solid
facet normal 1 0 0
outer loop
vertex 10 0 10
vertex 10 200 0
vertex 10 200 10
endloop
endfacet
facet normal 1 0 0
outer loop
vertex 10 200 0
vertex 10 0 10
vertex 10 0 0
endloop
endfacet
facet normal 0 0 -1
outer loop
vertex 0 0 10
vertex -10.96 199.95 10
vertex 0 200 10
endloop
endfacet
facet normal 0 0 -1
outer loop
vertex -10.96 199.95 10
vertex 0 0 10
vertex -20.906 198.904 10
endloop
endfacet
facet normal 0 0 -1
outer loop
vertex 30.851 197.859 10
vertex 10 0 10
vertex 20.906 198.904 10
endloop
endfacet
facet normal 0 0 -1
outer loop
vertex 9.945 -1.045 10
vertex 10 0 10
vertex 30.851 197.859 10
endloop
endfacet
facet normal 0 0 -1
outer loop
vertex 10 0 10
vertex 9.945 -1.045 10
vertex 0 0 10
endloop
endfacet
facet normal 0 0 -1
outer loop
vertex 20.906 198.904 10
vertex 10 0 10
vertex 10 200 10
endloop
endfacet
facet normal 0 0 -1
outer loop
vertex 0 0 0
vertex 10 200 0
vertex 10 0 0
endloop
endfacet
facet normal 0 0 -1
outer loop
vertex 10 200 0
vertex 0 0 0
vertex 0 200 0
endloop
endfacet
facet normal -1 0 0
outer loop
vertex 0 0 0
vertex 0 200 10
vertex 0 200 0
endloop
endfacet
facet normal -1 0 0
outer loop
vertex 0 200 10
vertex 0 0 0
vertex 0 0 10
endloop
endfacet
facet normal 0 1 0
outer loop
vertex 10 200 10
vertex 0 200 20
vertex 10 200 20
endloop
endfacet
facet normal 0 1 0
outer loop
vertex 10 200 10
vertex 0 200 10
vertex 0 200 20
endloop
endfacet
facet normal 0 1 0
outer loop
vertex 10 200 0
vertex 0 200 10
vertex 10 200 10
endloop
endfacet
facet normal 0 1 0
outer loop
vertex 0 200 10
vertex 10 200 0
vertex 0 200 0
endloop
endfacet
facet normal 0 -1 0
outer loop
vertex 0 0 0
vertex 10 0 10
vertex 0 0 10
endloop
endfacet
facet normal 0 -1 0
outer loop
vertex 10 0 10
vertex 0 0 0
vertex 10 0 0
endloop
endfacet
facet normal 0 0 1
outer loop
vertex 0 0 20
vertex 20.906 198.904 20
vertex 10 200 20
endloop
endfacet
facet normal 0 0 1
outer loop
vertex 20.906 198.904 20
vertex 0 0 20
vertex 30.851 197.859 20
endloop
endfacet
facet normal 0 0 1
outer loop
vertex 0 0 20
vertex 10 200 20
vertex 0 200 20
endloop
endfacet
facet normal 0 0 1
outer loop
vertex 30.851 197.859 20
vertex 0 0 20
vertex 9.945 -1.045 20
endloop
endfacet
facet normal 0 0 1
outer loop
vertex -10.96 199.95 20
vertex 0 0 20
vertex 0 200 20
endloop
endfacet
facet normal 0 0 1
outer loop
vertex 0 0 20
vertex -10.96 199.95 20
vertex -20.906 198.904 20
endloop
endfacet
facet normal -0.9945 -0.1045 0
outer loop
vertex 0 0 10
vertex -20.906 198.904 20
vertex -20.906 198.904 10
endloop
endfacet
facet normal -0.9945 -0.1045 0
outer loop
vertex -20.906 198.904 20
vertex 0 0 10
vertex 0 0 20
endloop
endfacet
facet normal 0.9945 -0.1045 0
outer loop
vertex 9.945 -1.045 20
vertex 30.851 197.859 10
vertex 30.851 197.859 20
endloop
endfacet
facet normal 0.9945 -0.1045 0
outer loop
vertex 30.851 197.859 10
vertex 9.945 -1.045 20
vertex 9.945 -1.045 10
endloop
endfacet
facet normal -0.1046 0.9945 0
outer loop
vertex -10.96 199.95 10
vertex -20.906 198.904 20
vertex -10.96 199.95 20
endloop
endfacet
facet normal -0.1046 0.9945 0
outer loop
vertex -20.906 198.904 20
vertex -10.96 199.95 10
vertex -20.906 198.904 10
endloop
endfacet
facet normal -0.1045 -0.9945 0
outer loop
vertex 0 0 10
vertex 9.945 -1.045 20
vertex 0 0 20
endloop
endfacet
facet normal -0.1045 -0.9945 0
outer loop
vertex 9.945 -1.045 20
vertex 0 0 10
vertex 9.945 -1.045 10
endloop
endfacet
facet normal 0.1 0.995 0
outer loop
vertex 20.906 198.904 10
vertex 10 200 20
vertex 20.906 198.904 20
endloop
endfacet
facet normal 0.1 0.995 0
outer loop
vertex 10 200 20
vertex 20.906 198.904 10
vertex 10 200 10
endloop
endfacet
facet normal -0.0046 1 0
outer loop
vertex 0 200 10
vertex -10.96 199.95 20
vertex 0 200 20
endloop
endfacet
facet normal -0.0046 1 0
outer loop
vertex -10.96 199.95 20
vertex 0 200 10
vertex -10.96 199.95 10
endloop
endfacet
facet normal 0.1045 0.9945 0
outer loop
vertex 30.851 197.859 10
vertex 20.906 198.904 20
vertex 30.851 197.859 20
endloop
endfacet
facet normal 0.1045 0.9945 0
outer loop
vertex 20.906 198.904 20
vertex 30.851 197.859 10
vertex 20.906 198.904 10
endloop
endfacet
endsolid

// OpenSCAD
cube([10, 200, 10]);
translate([0, 0, 10]) {
	hull() {
		rotate([0, 0, 6]) {
			cube([10, 200, 10]);
		}
		cube([10, 200, 10]);
		rotate([0, 0, -6]) {
			cube([10, 200, 10]);
		}
	}
}
